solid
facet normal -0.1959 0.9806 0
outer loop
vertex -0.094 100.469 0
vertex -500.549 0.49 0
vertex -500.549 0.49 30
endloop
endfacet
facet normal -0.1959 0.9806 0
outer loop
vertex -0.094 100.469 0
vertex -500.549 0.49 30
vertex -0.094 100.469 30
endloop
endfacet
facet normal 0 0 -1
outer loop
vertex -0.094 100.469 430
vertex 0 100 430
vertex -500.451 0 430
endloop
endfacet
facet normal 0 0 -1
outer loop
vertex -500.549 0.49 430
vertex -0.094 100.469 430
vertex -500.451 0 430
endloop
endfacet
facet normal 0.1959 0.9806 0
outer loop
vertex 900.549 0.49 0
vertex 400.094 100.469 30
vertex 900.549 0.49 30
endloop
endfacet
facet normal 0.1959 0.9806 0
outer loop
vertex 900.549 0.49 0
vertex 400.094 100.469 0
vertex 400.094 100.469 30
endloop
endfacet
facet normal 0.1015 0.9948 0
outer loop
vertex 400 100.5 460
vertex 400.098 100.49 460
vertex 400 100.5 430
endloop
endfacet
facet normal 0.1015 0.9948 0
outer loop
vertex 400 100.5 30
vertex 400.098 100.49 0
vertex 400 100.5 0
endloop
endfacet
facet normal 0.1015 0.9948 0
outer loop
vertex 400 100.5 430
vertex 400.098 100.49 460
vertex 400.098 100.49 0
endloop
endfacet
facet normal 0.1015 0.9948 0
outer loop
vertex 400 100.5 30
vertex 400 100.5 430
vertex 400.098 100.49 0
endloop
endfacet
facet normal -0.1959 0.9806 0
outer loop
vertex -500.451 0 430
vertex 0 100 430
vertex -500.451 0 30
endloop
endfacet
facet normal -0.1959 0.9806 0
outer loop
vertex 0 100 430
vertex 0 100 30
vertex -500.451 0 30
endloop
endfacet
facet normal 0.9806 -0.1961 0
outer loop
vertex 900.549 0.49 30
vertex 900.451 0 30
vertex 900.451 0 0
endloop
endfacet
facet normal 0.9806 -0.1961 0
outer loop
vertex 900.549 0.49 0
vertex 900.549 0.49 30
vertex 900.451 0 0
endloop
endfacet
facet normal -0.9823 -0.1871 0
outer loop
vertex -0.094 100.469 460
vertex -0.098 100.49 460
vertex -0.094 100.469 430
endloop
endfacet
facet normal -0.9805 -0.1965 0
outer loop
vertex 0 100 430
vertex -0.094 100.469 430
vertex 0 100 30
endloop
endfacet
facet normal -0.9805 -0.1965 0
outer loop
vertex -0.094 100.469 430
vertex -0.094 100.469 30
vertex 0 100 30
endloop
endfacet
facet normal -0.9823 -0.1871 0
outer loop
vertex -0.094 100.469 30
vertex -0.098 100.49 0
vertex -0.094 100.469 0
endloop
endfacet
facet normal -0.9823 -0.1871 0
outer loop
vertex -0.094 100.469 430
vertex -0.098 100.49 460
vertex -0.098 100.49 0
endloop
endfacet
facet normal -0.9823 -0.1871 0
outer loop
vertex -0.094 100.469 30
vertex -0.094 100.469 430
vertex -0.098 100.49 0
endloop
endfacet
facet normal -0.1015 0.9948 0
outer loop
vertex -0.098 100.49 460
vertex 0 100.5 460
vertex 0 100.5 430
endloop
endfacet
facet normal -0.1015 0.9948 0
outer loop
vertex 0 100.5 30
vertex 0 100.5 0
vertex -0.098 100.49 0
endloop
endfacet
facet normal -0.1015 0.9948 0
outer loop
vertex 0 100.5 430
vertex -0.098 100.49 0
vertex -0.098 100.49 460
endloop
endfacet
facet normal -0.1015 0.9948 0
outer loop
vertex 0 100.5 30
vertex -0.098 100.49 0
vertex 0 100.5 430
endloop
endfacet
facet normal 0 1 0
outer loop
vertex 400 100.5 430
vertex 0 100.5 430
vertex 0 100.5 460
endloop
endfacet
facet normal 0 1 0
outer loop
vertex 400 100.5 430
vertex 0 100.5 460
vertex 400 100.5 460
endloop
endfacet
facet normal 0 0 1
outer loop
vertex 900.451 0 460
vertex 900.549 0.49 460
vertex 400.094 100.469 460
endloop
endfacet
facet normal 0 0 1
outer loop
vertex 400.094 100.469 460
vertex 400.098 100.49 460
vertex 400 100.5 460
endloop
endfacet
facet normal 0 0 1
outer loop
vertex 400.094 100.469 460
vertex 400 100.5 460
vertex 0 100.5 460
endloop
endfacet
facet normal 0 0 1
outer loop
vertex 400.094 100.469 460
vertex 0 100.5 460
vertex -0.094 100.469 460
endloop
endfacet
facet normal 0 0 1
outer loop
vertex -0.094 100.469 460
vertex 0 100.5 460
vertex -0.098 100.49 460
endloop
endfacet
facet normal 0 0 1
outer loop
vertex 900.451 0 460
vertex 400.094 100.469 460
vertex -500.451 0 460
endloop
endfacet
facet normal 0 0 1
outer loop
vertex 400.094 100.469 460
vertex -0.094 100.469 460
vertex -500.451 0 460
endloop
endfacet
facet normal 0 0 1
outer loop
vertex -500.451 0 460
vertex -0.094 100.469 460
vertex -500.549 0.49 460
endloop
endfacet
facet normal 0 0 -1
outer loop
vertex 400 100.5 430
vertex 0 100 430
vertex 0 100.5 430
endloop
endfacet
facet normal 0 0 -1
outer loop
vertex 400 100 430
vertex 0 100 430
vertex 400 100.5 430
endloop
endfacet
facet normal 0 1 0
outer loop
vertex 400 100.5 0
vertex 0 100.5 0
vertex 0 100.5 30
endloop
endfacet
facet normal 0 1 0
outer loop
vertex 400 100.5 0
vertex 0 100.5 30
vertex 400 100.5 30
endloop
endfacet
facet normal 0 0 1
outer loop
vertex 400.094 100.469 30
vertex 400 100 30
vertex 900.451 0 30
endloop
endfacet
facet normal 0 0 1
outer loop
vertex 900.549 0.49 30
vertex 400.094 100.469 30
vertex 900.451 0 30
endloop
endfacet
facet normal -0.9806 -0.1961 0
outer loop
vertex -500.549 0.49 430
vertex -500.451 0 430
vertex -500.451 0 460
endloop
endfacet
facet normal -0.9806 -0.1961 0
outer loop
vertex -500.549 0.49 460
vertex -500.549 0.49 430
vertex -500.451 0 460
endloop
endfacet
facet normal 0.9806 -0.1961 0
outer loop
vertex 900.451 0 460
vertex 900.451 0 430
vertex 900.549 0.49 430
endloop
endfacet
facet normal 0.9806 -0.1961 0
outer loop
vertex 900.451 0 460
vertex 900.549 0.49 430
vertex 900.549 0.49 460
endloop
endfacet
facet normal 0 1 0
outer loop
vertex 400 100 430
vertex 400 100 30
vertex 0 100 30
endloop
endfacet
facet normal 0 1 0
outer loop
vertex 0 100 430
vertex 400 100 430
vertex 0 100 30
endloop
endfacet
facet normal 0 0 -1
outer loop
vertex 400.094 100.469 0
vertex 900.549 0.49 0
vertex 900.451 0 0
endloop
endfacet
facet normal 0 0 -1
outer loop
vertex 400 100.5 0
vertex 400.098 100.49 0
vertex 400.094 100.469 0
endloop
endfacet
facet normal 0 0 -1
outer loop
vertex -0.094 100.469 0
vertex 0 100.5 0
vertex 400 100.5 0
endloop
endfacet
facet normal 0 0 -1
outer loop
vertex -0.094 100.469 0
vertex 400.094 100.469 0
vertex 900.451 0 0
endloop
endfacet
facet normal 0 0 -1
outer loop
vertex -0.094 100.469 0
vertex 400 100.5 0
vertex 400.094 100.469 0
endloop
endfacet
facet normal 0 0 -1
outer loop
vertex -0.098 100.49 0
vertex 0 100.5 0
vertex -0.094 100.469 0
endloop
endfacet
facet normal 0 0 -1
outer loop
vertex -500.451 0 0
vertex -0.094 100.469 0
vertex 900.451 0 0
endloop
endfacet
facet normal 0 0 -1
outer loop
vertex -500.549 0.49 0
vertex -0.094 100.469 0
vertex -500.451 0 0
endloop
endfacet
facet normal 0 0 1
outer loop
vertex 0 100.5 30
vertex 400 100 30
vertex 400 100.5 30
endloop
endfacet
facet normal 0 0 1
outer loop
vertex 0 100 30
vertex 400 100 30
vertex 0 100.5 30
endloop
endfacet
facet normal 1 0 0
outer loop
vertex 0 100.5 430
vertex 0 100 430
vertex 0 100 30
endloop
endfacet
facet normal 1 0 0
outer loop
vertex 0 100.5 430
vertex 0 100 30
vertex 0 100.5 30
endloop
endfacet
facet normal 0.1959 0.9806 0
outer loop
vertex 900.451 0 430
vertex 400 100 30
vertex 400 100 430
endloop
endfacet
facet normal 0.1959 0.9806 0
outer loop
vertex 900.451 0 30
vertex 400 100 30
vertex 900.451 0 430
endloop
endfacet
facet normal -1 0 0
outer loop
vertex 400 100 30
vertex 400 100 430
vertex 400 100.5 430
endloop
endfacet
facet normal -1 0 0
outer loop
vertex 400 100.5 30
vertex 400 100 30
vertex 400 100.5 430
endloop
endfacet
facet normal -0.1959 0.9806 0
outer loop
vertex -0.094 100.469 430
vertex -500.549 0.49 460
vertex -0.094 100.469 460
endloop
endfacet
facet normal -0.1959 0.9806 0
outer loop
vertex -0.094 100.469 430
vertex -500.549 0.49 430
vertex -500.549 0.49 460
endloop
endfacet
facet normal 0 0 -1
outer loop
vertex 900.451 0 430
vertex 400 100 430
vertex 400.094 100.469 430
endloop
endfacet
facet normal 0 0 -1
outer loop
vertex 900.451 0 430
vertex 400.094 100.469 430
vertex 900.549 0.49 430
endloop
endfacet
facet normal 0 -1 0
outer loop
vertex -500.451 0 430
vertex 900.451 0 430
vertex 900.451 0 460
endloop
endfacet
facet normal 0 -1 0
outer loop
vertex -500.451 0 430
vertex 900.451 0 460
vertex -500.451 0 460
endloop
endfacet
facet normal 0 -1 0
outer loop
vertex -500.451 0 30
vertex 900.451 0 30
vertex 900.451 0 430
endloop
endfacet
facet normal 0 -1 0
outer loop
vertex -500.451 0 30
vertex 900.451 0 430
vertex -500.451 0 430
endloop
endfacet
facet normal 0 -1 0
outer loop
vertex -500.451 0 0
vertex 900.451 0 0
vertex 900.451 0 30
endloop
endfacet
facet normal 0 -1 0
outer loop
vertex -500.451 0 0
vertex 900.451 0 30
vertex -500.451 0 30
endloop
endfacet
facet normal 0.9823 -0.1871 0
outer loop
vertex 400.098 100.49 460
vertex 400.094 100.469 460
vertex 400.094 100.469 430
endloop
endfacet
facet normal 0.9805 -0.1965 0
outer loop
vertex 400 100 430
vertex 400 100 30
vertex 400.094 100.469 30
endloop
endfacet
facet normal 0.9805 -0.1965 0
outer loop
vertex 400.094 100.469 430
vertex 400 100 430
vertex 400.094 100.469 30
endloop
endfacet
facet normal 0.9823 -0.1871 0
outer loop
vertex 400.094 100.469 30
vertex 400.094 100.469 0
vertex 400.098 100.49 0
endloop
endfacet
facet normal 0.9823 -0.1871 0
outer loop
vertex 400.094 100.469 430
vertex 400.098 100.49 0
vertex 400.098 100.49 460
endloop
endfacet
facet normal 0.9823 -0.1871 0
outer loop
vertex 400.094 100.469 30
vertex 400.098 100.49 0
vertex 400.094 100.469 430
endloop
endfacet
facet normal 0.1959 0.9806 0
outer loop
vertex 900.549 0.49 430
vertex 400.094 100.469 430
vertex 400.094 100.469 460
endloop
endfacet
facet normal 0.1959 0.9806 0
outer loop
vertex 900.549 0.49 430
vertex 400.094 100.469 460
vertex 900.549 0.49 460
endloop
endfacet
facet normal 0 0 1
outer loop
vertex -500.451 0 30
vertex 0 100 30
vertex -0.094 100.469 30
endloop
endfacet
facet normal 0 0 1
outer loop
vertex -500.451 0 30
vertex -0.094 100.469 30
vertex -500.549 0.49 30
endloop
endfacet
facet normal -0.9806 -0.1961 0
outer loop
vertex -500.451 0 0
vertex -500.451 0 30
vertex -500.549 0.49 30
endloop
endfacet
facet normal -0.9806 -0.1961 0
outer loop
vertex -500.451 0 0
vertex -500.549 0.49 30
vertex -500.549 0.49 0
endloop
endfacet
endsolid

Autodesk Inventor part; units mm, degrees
ref_plane "YZ Plane" through (0, 0, 0) normal (1, 0, 0) x (0, 1, 0)
ref_plane "XZ Plane" through (0, 0, 0) normal (0, 1, 0) x (-1, 0, 0)
ref_plane "XY Plane" through (0, 0, 0) normal (0, 0, 1) x (1, 0, 0)
sketch "Sketch1" plane through (0, 0, 0) normal (0, 0, 1) x (1, 0, 0)
  line L0 (0, 0) -> (400, 0)
  line L1 (400, 0) -> (400, 100)
  line L2 (400, 100) -> (0, 100)
  line L3 (0, 100) -> (0, 0)
  line L4 (400, 100) -> (451.0344, 100) construction
  line L5 (0, 100) -> (51.0344, 100) construction
  line L6 (400, 100) -> (900.4511, 0)
  line L7 (400, 100) -> (910.3443, 100) construction
  line L8 (900.4511, 0) -> (400, 0)
  line L9 (0, 100) -> (-500.4511, 0)
  line L10 (0, 100) -> (510.3443, 100) construction
  line L11 (-500.4511, 0) -> (0, 0)
  dimension "d0" = 400
  dimension "d1" = 100
  dimension "d6" = 11.3
  dimension "d7" = 168.7
extrude "Extrusion1" add sketch "Sketch1" along normal blind 460
sketch "Sketch2" plane through (0, 100, 0) normal (0, 1, 0) x (1, 0, 0)
  line L0 (400, 0) -> (400, -460) projected
  line L1 (0, 0) -> (400, 0)
  line L2 (400, 0) -> (400, -30)
  line L3 (400, -30) -> (0, -30)
  line L4 (0, -30) -> (0, 0)
  line L5 (0, 0) -> (0, -460) projected
  line L6 (400, -460) -> (0, -460)
  line L7 (0, -460) -> (0, -430)
  line L8 (0, -430) -> (400, -430)
  line L9 (400, -430) -> (400, -460)
  dimension "d8" = 30
  dimension "d9" = 30
extrude "Extrusion2" add sketch "Sketch2" along normal blind 0.5 contours L0 L3 L4 L1 | L0 L6 L5 L8
sketch "Sketch3" plane through (900.4511, 0, 460) normal (0.1959, 0.9806, 0) x (0.9806, -0.1959, 0)
  line L0 (-1373.7453, 460) -> (0, 460) projected
  line L1 (-510.3443, 430) -> (-902.5902, 430) projected
  line L2 (0, 460) -> (-510.3443, 460)
  line L3 (-510.3443, 460) -> (-510.3443, 430)
  line L4 (-510.3443, 430) -> (0, 430)
  line L5 (0, 430) -> (0, 460)
  line L6 (0, 460) -> (0, 0) projected
  line L7 (-510.3443, 430) -> (-510.3443, 30) projected
  line L8 (0, 0) -> (-510.3443, 0)
  line L9 (-510.3443, 0) -> (-510.3443, 30)
  line L10 (-510.3443, 30) -> (0, 30)
  line L11 (0, 30) -> (0, 0)
  point P0 (-882.9956, 460)
  point P1 (-510.3443, 460)
  dimension "d12" = 30
  dimension "d13" = 510.3443
  dimension "d14" = 30
extrude "Extrusion3" add sketch "Sketch3" along normal blind 0.5 contours L0 L5 L4 L3 | L10 L6 L8 L9
sketch "Sketch4" plane through (-500.4511, 0, 460) normal (-0.1959, 0.9806, 0) x (0.9806, 0.1959, 0)
  line L0 (510.3443, 460) -> (0, 460) projected
  line L1 (902.5902, 430) -> (510.3443, 430) projected
  line L2 (0, 460) -> (510.3443, 460)
  line L3 (510.3443, 460) -> (510.3443, 430)
  line L4 (510.3443, 430) -> (0, 430)
  line L5 (0, 430) -> (0, 460)
  line L6 (510.3443, 0) -> (0, 0) projected
  line L7 (510.3443, 30) -> (902.5902, 30) projected
  line L8 (0, 0) -> (510.3443, 0)
  line L9 (510.3443, 0) -> (510.3443, 30)
  line L10 (510.3443, 30) -> (0, 30)
  line L11 (0, 30) -> (0, 0)
  point P0 (490.7497, 460)
  dimension "d17" = 30
  dimension "d18" = 30
extrude "Extrusion4" add sketch "Sketch4" along normal blind 0.5
sketch "Sketch5" plane through (0, 0, 0) normal (0, 0, -1) x (-1, 0, 0)
  line L0 (0, 100.5) -> (-400, 100.5) projected
  line L1 (500.5491, 0.4903) -> (0.098, 100.4903) projected
  line L2 (0, 100.5) -> (0.098, 100.4903)
  line L3 (500.4511, 0) -> (0, 100) projected
  line L4 (0.098, 100.4903) -> (0, 100)
  line L5 (0, 100) -> (0, 100.5) projected
  line L6 (0, 100) -> (0, 100.5)
  point P0 (0, 0)
extrude "Extrusion5" add sketch "Sketch5" against normal blind 460
sketch "Sketch6" plane through (0, 0, 0) normal (0, 0, -1) x (-1, 0, 0)
  line L0 (-400, 100) -> (-400, 100.5) projected
  line L1 (-400, 100.5) -> (-400, 100)
  line L2 (-400.098, 100.4903) -> (-900.5491, 0.4903) projected
  line L3 (-400, 100) -> (-400.098, 100.4903)
  line L4 (-400, 100.5) -> (0, 100.5) projected
  line L5 (-400.098, 100.4903) -> (-400, 100.5)
  point P0 (0, 0)
extrude "Extrusion6" add sketch "Sketch6" against normal blind 460
properties part number "cad bestanden"
